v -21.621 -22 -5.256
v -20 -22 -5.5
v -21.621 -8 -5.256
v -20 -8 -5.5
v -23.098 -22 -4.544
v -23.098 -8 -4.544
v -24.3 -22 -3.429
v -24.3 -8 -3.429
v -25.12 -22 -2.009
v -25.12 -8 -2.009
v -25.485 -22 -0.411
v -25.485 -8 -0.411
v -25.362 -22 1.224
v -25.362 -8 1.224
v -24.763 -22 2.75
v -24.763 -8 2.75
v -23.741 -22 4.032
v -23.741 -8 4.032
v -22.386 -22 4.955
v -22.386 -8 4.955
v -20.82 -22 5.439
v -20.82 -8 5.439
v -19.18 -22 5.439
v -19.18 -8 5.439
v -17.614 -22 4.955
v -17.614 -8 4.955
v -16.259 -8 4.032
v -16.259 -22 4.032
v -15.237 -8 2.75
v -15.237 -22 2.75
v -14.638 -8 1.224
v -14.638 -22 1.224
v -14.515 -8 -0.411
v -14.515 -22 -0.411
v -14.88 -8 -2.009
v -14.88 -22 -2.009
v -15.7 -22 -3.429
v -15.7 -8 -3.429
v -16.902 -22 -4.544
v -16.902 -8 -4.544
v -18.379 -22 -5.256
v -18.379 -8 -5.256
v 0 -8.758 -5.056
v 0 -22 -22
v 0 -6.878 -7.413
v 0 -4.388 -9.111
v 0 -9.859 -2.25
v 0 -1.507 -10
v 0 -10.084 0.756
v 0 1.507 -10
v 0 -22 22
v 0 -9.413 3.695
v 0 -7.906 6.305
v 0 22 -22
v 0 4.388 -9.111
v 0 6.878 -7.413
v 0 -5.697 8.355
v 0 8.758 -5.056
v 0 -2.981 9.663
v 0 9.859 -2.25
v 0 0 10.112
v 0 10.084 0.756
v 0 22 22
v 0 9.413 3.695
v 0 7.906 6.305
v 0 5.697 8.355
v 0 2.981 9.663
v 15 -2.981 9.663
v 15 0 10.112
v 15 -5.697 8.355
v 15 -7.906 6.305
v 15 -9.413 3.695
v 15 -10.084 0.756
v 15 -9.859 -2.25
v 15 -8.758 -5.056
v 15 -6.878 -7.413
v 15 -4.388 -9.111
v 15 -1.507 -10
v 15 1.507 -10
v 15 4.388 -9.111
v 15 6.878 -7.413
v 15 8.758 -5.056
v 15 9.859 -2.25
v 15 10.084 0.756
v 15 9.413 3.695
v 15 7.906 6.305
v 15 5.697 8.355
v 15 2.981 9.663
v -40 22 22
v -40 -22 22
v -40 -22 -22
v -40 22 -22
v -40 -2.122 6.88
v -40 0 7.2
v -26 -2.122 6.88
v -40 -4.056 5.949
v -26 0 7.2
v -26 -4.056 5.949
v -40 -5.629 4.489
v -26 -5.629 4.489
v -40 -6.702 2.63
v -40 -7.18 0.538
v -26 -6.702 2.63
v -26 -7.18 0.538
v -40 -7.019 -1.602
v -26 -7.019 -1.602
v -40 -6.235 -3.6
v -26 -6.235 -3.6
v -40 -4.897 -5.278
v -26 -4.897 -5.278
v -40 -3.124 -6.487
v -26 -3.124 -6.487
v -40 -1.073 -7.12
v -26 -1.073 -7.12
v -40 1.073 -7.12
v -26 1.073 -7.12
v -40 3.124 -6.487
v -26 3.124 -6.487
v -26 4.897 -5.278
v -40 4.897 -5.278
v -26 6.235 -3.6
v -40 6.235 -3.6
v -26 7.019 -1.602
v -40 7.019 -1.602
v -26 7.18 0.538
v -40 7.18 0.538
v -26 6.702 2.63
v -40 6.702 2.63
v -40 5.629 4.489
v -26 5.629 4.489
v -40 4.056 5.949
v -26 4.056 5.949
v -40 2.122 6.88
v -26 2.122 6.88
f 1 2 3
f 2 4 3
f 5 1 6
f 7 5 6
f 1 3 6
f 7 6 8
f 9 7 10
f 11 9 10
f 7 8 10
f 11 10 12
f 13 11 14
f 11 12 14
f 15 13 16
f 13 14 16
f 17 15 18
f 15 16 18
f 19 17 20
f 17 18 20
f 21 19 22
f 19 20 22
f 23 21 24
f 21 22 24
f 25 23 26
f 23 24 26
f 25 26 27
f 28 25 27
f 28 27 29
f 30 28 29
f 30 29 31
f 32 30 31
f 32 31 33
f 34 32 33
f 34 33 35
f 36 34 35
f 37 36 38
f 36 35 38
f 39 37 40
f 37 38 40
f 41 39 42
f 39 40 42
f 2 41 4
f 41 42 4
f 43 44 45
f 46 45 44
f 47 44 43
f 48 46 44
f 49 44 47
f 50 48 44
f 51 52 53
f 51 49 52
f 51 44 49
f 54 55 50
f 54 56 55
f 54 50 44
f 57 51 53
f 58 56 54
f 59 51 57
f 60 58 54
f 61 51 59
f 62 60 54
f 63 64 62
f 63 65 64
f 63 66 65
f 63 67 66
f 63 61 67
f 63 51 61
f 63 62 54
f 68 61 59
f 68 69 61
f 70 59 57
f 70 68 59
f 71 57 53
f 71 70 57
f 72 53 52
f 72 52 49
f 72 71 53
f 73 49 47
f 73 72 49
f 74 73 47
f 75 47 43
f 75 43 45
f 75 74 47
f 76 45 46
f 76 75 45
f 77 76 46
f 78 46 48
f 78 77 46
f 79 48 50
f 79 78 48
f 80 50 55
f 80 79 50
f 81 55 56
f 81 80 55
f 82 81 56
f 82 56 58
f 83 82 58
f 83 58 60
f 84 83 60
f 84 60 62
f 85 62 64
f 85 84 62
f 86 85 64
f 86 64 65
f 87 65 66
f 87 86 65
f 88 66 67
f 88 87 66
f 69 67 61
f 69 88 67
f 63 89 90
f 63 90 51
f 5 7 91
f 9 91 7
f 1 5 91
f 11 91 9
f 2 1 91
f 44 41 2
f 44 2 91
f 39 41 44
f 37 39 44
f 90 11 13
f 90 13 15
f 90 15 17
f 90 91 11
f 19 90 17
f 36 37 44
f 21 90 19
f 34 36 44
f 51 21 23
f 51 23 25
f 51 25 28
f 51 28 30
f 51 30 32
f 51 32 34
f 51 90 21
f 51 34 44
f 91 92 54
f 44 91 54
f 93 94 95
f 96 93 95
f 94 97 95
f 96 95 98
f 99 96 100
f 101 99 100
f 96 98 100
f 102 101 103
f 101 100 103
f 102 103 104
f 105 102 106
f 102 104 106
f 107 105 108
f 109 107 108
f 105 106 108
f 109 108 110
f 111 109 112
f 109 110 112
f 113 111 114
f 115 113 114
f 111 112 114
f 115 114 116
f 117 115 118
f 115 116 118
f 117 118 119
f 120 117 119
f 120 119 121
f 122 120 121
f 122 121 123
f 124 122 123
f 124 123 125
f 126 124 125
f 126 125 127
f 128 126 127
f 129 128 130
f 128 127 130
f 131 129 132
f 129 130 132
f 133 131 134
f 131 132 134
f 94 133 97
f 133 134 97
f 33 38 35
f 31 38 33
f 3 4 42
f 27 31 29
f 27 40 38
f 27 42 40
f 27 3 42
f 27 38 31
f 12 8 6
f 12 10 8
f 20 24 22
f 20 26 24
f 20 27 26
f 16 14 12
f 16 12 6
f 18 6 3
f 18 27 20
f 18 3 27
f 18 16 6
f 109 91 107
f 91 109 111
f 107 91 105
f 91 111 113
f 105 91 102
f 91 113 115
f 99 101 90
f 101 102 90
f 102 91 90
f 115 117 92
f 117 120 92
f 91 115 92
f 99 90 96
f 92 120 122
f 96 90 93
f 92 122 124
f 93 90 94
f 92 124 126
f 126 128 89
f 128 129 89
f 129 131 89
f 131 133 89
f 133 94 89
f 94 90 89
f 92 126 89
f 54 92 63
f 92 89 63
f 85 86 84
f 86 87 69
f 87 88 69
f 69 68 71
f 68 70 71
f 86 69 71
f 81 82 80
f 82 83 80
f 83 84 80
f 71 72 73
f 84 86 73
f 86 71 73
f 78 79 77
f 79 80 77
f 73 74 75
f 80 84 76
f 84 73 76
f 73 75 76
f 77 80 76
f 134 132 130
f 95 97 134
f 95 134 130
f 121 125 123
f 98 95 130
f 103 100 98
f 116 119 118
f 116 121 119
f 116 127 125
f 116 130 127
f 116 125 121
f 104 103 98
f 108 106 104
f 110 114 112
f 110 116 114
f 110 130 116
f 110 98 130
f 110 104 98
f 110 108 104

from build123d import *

# Parameters (mm, degrees)
BLOCK_SKETCH_W          = 40
BLOCK_SKETCH_H          = 44
BLOCK_DEPTH             = 22
NECK_SKETCH_W           = 15
NECK_SKETCH_H           = 10.1125
REGULATOR_PORT_SKETCH_W = 15
REGULATOR_PORT_SKETCH_H = 7.2
SIDE_PORT_Y_SKETCH_W    = 5.5
SIDE_PORT_Y_SKETCH_H    = 15


with BuildPart() as part:
    # Block Sketch → Block (new, symmetric)
    with BuildSketch(Plane.XY):
        with Locations((-20, 0)):
            Rectangle(BLOCK_SKETCH_W, BLOCK_SKETCH_H)
    extrude(amount=BLOCK_DEPTH, both=True)

    # Neck Sketch → Neck (revolve)
    with BuildSketch(Plane.XY):
        with Locations((7.5, 5.05625)):
            Rectangle(NECK_SKETCH_W, NECK_SKETCH_H)
    revolve(axis=Axis((-1000, 0, 0), (1, 0, 0)))

    # Regulator Port Sketch → Regulator Port (revolve, cut)
    with BuildSketch(Plane.XY):
        with Locations((-33.5, 3.6)):
            Rectangle(REGULATOR_PORT_SKETCH_W, REGULATOR_PORT_SKETCH_H)
    revolve(axis=Axis((-1000, 0, 0), (1, 0, 0)), mode=Mode.SUBTRACT)

    # Side Port -Y Sketch → Side Port -Y (revolve, cut)
    with BuildSketch(Plane.XY):
        with Locations((-17.25, -15.5)):
            Rectangle(SIDE_PORT_Y_SKETCH_W, SIDE_PORT_Y_SKETCH_H)
    revolve(axis=Axis((-20, -40, 0), (0, 1, 0)), mode=Mode.SUBTRACT)


solid = part.part
